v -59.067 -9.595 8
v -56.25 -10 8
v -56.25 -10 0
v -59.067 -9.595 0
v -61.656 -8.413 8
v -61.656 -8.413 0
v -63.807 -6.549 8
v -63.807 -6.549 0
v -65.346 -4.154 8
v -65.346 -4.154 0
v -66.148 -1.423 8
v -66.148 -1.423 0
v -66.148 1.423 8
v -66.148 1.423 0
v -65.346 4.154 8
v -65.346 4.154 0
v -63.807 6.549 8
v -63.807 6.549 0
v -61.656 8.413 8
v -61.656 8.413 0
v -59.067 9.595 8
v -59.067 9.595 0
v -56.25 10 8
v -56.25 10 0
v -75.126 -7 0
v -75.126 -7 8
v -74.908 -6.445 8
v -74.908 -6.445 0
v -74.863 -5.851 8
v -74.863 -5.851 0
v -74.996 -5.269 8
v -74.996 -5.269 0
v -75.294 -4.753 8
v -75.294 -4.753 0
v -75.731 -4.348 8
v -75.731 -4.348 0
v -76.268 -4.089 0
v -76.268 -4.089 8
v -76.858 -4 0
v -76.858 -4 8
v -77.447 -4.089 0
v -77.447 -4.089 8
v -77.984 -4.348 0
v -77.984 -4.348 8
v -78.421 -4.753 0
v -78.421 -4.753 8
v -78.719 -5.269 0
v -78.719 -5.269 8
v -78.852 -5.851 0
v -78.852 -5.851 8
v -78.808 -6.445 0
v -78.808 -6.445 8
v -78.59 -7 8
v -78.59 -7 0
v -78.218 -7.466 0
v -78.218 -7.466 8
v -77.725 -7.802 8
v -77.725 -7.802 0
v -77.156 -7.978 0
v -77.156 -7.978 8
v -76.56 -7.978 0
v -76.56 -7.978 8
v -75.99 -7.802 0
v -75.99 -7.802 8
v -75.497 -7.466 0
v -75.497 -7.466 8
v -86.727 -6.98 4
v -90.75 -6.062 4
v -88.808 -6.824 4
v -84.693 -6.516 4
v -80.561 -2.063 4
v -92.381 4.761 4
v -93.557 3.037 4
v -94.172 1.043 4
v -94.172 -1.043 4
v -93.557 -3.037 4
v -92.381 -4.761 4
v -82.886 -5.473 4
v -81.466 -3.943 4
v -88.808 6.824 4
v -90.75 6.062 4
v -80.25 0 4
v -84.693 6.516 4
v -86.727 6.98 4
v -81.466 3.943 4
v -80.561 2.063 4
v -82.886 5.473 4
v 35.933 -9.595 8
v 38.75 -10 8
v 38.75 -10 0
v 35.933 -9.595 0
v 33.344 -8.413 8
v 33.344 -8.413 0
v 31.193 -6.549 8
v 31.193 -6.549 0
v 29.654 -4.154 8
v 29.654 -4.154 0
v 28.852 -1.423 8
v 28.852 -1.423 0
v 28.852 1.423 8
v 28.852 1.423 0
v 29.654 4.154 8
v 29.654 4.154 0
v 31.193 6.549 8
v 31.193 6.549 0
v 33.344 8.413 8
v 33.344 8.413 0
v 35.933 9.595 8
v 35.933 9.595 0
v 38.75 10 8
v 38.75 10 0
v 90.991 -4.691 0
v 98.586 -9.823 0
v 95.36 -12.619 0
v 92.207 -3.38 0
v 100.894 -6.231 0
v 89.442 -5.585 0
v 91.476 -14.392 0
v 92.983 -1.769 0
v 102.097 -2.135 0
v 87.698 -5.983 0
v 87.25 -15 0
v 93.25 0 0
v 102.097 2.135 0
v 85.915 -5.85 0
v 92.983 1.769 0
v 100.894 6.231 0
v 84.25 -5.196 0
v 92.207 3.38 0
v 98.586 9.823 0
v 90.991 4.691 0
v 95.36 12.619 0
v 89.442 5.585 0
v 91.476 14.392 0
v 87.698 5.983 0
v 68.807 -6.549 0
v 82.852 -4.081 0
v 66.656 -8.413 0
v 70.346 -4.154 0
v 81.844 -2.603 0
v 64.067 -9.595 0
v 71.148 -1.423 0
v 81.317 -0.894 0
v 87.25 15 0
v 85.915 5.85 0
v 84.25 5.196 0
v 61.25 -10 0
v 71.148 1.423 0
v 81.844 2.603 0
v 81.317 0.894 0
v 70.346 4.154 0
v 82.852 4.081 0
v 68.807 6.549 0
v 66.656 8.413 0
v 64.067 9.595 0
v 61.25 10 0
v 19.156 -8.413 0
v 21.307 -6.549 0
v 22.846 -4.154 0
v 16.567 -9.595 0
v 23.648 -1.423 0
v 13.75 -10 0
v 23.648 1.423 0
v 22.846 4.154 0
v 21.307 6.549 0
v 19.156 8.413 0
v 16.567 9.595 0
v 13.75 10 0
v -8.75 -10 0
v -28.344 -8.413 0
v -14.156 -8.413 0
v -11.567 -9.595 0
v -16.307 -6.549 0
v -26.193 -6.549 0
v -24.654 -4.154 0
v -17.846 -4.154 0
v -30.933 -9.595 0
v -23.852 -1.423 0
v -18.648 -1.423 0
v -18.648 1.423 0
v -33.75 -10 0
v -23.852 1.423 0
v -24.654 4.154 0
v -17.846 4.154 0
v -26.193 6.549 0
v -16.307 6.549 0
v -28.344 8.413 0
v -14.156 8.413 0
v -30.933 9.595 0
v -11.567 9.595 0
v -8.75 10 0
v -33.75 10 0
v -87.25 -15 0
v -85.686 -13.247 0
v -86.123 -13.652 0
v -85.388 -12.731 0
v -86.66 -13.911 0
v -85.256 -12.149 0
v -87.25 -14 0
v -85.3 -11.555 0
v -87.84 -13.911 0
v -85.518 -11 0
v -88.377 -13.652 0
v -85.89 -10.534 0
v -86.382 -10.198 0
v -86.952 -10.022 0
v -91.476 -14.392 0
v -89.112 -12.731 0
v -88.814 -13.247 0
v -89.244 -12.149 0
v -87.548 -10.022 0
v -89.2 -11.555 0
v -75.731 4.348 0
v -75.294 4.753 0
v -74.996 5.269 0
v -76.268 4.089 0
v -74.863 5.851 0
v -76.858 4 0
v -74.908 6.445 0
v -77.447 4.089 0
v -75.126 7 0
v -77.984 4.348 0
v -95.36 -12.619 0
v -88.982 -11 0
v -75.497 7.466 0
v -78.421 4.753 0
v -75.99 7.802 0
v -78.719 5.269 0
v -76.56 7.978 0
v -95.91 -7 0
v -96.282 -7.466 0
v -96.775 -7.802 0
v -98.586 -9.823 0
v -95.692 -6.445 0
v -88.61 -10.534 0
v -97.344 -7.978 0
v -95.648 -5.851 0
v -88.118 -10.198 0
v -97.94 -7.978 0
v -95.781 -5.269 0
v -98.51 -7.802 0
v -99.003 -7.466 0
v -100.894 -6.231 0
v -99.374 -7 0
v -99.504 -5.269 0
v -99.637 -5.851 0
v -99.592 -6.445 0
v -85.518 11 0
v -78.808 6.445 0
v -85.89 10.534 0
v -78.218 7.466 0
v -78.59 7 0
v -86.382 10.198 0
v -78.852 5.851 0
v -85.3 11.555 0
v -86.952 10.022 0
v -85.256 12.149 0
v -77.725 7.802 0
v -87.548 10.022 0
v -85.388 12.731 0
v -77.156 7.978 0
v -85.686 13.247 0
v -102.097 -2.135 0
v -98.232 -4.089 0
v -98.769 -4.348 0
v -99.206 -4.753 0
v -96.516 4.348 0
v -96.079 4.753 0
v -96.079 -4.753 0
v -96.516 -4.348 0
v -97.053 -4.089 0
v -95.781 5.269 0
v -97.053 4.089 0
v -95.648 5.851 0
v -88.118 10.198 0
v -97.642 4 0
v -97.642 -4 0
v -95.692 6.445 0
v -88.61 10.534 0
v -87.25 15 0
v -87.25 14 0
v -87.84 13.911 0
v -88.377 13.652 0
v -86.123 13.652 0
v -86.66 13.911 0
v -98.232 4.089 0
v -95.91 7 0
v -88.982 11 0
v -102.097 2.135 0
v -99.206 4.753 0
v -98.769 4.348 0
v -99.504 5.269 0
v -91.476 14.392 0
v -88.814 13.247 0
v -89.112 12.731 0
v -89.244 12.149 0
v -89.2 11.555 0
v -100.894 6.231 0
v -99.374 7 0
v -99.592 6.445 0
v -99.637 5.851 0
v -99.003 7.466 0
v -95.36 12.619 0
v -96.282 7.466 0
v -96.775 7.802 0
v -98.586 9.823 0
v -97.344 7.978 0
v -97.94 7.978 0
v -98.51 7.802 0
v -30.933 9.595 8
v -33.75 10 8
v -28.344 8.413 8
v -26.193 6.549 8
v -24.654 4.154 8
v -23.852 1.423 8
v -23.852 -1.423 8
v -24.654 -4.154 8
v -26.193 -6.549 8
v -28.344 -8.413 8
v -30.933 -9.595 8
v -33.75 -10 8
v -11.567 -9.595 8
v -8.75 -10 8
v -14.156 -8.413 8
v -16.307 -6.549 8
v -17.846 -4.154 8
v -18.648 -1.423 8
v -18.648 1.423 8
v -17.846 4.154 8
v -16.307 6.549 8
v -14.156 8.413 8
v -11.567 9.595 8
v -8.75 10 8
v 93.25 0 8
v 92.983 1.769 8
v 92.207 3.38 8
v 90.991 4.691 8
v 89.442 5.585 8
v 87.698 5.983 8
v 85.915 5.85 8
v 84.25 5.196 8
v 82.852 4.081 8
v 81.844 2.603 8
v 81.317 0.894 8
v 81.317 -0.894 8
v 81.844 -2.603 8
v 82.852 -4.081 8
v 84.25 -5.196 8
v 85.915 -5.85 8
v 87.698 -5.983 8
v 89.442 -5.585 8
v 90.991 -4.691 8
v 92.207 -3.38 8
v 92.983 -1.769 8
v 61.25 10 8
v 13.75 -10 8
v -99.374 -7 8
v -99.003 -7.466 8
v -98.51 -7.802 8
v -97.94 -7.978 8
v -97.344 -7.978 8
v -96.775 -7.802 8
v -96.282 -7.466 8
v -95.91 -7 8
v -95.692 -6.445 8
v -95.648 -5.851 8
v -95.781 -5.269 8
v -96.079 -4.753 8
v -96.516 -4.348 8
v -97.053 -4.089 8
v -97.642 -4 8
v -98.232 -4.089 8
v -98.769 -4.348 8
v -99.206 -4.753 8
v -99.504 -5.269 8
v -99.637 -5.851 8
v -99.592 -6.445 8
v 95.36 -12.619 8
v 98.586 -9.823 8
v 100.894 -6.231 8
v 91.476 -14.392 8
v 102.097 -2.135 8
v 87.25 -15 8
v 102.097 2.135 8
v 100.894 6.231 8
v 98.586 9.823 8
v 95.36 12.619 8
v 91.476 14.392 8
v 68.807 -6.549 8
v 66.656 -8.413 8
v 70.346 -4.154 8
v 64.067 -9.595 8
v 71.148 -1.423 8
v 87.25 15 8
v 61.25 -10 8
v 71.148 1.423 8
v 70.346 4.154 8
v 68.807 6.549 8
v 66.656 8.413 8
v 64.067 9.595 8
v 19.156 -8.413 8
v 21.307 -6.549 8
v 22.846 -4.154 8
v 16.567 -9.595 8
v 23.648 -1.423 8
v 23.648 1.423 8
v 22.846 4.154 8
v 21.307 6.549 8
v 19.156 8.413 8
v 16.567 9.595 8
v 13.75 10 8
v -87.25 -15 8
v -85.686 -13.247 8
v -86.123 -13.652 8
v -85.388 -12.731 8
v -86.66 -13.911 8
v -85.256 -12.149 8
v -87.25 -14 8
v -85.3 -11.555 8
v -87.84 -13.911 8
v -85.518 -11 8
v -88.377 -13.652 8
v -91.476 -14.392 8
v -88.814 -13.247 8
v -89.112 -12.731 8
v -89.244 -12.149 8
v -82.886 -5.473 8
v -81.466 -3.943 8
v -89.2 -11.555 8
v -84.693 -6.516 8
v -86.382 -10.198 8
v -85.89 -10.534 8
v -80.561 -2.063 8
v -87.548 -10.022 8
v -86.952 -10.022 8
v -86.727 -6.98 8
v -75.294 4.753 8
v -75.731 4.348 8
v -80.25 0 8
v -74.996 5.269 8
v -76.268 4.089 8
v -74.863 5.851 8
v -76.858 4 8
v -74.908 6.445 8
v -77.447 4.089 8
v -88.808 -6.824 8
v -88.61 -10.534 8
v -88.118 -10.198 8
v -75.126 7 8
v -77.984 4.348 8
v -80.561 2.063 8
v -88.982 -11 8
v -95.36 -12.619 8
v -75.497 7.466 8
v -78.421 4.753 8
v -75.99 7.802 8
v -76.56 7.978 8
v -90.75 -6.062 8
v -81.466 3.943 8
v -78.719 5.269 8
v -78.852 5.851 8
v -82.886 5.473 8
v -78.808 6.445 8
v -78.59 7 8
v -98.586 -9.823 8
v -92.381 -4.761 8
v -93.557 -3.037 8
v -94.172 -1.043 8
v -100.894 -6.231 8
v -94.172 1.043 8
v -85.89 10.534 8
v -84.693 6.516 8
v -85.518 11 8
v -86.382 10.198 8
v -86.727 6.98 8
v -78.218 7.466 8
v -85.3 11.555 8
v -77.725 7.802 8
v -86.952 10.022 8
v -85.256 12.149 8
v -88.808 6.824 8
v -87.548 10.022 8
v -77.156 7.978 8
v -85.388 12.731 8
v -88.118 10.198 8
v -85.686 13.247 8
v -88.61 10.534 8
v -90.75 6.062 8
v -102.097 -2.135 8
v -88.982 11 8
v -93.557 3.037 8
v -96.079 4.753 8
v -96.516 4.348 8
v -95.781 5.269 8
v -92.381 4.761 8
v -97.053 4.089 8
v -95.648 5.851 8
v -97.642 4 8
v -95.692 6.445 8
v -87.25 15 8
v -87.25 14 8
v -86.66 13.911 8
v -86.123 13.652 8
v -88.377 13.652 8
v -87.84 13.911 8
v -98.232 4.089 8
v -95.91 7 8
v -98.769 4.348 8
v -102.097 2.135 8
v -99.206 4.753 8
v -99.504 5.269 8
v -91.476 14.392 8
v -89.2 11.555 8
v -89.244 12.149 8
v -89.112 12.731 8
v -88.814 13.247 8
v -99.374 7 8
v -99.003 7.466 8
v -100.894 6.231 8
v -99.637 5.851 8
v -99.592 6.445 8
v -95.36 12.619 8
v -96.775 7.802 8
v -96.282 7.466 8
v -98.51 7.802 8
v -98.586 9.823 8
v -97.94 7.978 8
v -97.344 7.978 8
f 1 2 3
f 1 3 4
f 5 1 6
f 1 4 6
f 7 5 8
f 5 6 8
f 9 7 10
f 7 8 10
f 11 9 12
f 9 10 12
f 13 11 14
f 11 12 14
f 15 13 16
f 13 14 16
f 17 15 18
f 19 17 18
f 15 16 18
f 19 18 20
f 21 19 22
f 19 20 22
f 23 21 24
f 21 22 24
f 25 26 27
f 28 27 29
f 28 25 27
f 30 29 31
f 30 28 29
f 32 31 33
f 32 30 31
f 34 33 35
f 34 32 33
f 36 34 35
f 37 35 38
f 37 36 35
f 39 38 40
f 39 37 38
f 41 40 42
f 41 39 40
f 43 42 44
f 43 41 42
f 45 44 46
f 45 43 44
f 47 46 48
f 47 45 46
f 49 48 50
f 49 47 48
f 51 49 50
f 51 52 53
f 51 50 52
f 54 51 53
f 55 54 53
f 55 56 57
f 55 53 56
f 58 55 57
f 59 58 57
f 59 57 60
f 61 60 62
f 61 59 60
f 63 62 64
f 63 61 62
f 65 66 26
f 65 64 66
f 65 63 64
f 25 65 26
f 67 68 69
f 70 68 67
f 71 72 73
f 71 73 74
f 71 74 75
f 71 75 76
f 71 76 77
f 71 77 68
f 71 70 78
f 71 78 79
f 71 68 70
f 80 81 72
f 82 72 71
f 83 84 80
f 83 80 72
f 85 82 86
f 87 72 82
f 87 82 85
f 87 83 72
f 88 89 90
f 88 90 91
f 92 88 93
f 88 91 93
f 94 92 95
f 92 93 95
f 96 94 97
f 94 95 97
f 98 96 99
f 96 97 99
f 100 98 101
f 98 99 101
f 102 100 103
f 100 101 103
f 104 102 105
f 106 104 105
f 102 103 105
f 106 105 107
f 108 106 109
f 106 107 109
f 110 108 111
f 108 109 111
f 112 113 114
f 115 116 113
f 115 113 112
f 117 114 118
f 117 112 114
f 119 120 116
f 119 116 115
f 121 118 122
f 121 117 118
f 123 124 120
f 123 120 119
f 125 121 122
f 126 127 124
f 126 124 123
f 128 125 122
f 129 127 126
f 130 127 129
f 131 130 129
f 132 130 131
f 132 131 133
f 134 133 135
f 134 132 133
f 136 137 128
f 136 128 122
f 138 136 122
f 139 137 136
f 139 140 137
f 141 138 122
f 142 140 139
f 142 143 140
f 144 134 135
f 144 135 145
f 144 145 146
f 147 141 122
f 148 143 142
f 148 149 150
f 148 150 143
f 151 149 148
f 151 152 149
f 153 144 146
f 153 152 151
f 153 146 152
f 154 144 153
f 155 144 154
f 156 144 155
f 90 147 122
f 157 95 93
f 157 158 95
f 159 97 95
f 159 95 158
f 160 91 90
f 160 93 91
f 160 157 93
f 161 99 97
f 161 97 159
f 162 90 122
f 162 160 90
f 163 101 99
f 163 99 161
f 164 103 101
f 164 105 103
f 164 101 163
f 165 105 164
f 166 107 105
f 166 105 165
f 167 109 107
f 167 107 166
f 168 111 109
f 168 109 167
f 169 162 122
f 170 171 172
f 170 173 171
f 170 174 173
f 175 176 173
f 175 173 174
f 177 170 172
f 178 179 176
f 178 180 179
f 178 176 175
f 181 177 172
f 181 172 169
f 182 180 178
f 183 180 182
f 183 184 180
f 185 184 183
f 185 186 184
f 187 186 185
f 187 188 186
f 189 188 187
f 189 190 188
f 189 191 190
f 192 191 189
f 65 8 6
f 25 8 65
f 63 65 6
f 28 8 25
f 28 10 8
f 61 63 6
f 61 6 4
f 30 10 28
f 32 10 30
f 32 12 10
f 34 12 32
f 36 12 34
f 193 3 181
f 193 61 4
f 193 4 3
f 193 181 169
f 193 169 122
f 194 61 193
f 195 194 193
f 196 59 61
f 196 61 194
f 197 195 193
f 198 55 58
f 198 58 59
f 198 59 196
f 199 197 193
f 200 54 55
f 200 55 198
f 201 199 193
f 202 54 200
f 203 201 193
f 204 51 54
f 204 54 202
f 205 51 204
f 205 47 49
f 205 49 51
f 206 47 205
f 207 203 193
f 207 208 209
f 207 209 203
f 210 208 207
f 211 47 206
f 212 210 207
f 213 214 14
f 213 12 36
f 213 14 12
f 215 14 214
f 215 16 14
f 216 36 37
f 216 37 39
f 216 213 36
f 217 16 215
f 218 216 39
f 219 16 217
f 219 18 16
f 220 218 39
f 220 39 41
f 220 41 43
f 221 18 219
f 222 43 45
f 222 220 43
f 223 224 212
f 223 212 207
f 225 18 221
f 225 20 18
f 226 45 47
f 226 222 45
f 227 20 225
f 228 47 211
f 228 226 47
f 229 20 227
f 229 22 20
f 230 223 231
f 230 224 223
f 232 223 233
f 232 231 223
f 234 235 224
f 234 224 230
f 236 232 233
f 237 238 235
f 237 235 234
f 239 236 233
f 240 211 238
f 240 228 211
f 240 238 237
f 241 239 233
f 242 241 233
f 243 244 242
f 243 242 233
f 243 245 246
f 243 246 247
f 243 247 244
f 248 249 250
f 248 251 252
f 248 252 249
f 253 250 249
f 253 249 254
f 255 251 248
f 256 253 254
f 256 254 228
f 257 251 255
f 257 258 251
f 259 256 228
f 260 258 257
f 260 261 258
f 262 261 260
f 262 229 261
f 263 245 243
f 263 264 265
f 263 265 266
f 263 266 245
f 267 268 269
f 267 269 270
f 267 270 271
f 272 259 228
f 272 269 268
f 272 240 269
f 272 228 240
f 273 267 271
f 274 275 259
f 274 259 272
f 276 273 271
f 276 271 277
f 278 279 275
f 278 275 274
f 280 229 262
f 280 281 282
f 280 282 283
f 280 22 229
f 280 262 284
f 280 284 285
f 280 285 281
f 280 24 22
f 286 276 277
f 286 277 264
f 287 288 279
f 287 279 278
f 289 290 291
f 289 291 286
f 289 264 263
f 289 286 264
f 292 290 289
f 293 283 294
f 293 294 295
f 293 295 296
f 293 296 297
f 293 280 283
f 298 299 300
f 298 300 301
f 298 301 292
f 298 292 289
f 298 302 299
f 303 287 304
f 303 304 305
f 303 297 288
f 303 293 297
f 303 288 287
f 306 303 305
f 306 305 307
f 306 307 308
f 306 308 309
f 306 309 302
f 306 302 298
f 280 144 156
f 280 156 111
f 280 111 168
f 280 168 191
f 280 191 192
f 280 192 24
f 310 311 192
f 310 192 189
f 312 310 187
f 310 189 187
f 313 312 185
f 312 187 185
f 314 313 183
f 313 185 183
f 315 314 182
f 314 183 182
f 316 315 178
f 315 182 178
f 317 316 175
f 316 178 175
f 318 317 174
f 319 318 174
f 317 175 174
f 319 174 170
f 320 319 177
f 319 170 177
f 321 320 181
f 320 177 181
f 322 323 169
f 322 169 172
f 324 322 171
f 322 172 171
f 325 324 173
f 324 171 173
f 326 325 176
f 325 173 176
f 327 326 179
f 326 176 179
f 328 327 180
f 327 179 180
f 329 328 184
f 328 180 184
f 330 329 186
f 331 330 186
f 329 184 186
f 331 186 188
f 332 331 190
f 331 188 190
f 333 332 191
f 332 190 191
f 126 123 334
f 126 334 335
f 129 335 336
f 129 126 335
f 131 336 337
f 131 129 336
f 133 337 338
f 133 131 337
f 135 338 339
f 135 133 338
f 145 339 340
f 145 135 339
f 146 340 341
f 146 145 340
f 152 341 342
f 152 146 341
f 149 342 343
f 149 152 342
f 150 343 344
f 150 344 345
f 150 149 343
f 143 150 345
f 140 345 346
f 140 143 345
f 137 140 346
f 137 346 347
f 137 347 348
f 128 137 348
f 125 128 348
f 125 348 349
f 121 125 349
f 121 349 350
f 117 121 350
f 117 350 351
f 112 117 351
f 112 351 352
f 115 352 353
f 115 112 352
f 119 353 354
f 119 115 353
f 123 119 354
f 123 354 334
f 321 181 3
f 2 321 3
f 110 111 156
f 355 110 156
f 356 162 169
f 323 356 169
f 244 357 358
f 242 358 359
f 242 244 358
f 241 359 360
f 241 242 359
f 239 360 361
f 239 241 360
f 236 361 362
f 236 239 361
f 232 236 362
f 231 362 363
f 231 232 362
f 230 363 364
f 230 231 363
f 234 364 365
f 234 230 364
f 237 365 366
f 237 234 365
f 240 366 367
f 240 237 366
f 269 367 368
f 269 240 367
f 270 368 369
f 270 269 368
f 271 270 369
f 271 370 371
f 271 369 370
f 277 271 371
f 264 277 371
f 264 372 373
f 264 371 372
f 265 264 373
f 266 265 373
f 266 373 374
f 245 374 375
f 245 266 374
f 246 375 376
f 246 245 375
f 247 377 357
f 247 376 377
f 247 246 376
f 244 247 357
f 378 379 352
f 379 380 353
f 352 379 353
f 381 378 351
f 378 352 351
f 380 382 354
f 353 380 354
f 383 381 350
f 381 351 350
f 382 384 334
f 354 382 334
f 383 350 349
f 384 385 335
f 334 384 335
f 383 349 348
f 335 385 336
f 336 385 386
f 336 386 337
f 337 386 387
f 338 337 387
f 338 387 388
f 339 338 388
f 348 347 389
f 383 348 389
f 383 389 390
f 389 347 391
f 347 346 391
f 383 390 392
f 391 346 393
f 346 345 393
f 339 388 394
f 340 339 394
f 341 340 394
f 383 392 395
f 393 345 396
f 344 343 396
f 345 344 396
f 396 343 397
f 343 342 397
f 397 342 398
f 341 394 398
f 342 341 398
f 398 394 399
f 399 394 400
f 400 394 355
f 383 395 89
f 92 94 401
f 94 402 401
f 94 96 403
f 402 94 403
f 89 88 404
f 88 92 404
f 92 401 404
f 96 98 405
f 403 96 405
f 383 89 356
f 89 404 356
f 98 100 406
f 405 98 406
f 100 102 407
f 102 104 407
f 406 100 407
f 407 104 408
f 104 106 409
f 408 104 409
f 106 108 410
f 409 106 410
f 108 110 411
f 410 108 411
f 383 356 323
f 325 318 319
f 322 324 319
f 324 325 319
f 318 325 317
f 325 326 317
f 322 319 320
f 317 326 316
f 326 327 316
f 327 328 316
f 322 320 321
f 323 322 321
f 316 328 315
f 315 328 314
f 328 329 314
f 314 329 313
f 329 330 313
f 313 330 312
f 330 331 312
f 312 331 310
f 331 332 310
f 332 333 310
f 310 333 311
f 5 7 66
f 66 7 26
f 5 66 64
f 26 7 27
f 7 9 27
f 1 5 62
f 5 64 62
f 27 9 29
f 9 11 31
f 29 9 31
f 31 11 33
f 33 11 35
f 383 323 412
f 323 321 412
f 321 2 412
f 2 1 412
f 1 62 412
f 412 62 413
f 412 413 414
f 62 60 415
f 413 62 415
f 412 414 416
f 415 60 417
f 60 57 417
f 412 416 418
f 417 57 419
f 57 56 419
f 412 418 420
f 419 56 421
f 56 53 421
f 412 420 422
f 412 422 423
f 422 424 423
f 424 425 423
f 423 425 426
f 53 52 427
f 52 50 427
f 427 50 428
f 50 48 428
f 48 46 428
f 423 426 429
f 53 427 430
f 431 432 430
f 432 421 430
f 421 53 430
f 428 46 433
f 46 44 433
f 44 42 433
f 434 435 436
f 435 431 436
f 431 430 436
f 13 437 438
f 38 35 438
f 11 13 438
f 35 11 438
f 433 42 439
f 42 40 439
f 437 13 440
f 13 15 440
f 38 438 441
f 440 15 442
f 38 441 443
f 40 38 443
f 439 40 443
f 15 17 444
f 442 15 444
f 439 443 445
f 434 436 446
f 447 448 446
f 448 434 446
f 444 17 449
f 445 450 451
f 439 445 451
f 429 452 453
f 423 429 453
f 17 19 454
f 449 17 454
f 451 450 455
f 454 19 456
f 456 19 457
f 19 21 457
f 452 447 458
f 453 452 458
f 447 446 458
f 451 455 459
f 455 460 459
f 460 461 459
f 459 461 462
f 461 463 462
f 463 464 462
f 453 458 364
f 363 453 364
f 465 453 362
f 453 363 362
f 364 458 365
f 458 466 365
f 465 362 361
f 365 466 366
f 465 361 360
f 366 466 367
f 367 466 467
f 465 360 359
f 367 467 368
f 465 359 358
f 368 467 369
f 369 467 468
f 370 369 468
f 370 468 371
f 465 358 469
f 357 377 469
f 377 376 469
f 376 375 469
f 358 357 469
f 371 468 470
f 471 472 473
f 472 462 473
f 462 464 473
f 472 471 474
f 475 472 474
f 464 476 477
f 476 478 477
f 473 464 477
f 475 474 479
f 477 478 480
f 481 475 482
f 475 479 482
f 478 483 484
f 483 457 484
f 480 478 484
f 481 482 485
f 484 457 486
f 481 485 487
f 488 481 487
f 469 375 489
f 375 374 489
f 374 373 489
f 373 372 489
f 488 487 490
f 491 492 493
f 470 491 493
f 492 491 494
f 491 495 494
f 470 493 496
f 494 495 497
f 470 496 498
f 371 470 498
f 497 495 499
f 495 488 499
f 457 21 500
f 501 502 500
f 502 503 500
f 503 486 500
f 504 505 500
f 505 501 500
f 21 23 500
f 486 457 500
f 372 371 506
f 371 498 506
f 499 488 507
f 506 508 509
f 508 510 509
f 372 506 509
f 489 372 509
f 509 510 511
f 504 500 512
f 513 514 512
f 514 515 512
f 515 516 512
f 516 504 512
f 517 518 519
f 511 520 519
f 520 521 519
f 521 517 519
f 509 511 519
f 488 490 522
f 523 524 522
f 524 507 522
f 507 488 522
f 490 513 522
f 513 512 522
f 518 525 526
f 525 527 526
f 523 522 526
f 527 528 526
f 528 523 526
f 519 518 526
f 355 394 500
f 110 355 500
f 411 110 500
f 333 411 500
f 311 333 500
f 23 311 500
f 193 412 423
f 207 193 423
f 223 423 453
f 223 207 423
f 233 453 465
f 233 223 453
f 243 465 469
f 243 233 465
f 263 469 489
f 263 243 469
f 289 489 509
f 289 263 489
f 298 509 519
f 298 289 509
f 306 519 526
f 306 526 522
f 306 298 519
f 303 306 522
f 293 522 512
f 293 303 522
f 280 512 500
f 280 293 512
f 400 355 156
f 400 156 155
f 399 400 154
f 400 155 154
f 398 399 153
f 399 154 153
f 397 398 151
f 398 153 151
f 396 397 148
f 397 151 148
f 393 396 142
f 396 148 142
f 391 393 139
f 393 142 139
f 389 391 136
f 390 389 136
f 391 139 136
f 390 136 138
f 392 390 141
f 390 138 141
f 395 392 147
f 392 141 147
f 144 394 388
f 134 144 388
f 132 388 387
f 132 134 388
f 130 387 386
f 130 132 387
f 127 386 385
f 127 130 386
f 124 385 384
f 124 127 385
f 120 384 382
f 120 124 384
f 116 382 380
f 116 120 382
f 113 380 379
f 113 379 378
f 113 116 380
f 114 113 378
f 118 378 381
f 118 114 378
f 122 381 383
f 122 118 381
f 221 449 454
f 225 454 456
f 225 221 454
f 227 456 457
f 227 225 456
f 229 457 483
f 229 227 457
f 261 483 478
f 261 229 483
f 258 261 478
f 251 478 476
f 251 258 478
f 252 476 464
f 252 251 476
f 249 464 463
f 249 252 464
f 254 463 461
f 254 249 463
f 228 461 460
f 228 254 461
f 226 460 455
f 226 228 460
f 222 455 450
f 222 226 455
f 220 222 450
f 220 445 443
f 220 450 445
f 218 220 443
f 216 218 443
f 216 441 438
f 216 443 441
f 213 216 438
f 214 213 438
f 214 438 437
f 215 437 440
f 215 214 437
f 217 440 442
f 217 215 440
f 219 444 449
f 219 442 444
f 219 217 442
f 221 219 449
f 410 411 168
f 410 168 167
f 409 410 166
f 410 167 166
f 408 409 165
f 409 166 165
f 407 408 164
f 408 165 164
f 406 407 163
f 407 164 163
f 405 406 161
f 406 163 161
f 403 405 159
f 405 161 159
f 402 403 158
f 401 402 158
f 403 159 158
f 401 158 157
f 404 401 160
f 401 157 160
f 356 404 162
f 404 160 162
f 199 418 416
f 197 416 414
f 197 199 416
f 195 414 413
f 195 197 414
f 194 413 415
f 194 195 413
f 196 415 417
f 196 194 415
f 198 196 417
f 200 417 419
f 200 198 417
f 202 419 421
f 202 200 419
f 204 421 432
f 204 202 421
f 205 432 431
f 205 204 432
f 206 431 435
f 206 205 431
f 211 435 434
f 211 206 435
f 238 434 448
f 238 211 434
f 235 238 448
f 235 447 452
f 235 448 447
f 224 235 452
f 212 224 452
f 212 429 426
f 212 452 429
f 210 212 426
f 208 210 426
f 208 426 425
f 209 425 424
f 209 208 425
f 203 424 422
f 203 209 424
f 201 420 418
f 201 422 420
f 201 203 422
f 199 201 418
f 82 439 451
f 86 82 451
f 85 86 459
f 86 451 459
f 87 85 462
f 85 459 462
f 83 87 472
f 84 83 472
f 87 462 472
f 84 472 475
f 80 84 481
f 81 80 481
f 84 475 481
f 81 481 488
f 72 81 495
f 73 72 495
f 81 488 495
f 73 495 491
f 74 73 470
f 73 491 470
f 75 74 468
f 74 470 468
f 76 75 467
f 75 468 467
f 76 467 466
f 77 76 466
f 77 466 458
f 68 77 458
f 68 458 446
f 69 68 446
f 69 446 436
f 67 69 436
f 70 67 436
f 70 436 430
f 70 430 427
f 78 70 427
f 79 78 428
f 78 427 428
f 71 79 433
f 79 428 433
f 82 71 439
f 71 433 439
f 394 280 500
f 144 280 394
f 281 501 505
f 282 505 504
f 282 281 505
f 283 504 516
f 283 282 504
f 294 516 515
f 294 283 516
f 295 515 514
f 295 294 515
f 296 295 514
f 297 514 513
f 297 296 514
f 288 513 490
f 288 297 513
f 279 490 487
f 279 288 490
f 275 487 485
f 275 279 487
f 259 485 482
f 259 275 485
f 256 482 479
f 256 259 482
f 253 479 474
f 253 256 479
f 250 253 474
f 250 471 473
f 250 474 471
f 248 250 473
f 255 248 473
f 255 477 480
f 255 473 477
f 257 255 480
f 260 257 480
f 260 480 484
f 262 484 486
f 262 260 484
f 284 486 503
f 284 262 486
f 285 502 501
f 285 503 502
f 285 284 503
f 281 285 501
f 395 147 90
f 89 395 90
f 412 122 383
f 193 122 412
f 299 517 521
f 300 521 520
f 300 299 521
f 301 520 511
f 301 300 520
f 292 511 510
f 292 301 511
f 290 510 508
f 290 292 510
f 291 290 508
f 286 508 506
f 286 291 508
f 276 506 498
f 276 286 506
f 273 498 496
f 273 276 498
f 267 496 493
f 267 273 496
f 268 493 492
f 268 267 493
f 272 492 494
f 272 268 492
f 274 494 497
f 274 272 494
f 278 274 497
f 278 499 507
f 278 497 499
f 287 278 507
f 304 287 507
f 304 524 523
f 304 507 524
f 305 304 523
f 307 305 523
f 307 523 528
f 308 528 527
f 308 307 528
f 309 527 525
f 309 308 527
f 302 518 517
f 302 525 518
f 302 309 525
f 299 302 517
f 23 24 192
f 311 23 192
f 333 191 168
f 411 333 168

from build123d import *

# Parameters (mm, degrees)
SKETCH1_R           = 6
BOSS_EXTRUDE1_DEPTH = 8
CIRPATTERN1_COUNT   = 6
SKETCH9_R           = 7
CUT_EXTRUDE1_DEPTH  = 4


with BuildPart() as part:
    # Sketch1 → Boss-Extrude1 (new body)
    with BuildSketch(Plane.XY):
        with BuildLine():
            Line((-87.25, 15), (87.25, 15))
            ThreePointArc((87.25, 15), (102.25, 0), (87.25, -15))
            Line((87.25, -15), (-87.25, -15))
            ThreePointArc((-87.25, -15), (-102.25, 0), (-87.25, 15))
        make_face()
        with Locations((87.25, 0)):
            Circle(SKETCH1_R, mode=Mode.SUBTRACT)
        with BuildLine():
            Line((61.25, -10), (38.75, -10))
            ThreePointArc((38.75, -10), (28.75, 0), (38.75, 10))
            Line((38.75, 10), (61.25, 10))
            ThreePointArc((61.25, 10), (71.25, 0), (61.25, -10))
        make_face(mode=Mode.SUBTRACT)
        with BuildLine():
            Line((13.75, -10), (-8.75, -10))
            ThreePointArc((-8.75, -10), (-18.75, 0), (-8.75, 10))
            Line((-8.75, 10), (13.75, 10))
            ThreePointArc((13.75, 10), (23.75, 0), (13.75, -10))
        make_face(mode=Mode.SUBTRACT)
        with BuildLine():
            Line((-33.75, -10), (-56.25, -10))
            ThreePointArc((-56.25, -10), (-66.25, 0), (-56.25, 10))
            Line((-56.25, 10), (-33.75, 10))
            ThreePointArc((-33.75, 10), (-23.75, 0), (-33.75, -10))
        make_face(mode=Mode.SUBTRACT)
    extrude(amount=BOSS_EXTRUDE1_DEPTH)

    # Sketch7 → Ø4.0mm Dowel Hole1 (revolve, cut)
    with BuildSketch(Plane(origin=(-87.25, 12, 0), x_dir=(0, 1, 0), z_dir=(1, 0, 0))):
        Polygon((0, 0), (0, 101.201721238), (2, 100), (2, 0), align=None)
    f_4_0mm_dowel_hole1 = revolve(axis=Axis((-87.25, 12, -6.35), (0, 0, 1)), mode=Mode.SUBTRACT)

    # CirPattern1: Ø4.0mm Dowel Hole1 ×6 about axis
    cirpattern1_axis = Axis((-87.25, 0, 38), (0, 0, -1))
    for i in range(1, CIRPATTERN1_COUNT):
        add(f_4_0mm_dowel_hole1.rotate(cirpattern1_axis, i * 360 / CIRPATTERN1_COUNT), mode=Mode.SUBTRACT)

    # Sketch9 → Cut-Extrude1 (cut)
    with BuildSketch(Plane.XY.offset(8)):
        with Locations((-87.25, 0)):
            Circle(SKETCH9_R)
    extrude(amount=-CUT_EXTRUDE1_DEPTH, mode=Mode.SUBTRACT)


solid = part.part
